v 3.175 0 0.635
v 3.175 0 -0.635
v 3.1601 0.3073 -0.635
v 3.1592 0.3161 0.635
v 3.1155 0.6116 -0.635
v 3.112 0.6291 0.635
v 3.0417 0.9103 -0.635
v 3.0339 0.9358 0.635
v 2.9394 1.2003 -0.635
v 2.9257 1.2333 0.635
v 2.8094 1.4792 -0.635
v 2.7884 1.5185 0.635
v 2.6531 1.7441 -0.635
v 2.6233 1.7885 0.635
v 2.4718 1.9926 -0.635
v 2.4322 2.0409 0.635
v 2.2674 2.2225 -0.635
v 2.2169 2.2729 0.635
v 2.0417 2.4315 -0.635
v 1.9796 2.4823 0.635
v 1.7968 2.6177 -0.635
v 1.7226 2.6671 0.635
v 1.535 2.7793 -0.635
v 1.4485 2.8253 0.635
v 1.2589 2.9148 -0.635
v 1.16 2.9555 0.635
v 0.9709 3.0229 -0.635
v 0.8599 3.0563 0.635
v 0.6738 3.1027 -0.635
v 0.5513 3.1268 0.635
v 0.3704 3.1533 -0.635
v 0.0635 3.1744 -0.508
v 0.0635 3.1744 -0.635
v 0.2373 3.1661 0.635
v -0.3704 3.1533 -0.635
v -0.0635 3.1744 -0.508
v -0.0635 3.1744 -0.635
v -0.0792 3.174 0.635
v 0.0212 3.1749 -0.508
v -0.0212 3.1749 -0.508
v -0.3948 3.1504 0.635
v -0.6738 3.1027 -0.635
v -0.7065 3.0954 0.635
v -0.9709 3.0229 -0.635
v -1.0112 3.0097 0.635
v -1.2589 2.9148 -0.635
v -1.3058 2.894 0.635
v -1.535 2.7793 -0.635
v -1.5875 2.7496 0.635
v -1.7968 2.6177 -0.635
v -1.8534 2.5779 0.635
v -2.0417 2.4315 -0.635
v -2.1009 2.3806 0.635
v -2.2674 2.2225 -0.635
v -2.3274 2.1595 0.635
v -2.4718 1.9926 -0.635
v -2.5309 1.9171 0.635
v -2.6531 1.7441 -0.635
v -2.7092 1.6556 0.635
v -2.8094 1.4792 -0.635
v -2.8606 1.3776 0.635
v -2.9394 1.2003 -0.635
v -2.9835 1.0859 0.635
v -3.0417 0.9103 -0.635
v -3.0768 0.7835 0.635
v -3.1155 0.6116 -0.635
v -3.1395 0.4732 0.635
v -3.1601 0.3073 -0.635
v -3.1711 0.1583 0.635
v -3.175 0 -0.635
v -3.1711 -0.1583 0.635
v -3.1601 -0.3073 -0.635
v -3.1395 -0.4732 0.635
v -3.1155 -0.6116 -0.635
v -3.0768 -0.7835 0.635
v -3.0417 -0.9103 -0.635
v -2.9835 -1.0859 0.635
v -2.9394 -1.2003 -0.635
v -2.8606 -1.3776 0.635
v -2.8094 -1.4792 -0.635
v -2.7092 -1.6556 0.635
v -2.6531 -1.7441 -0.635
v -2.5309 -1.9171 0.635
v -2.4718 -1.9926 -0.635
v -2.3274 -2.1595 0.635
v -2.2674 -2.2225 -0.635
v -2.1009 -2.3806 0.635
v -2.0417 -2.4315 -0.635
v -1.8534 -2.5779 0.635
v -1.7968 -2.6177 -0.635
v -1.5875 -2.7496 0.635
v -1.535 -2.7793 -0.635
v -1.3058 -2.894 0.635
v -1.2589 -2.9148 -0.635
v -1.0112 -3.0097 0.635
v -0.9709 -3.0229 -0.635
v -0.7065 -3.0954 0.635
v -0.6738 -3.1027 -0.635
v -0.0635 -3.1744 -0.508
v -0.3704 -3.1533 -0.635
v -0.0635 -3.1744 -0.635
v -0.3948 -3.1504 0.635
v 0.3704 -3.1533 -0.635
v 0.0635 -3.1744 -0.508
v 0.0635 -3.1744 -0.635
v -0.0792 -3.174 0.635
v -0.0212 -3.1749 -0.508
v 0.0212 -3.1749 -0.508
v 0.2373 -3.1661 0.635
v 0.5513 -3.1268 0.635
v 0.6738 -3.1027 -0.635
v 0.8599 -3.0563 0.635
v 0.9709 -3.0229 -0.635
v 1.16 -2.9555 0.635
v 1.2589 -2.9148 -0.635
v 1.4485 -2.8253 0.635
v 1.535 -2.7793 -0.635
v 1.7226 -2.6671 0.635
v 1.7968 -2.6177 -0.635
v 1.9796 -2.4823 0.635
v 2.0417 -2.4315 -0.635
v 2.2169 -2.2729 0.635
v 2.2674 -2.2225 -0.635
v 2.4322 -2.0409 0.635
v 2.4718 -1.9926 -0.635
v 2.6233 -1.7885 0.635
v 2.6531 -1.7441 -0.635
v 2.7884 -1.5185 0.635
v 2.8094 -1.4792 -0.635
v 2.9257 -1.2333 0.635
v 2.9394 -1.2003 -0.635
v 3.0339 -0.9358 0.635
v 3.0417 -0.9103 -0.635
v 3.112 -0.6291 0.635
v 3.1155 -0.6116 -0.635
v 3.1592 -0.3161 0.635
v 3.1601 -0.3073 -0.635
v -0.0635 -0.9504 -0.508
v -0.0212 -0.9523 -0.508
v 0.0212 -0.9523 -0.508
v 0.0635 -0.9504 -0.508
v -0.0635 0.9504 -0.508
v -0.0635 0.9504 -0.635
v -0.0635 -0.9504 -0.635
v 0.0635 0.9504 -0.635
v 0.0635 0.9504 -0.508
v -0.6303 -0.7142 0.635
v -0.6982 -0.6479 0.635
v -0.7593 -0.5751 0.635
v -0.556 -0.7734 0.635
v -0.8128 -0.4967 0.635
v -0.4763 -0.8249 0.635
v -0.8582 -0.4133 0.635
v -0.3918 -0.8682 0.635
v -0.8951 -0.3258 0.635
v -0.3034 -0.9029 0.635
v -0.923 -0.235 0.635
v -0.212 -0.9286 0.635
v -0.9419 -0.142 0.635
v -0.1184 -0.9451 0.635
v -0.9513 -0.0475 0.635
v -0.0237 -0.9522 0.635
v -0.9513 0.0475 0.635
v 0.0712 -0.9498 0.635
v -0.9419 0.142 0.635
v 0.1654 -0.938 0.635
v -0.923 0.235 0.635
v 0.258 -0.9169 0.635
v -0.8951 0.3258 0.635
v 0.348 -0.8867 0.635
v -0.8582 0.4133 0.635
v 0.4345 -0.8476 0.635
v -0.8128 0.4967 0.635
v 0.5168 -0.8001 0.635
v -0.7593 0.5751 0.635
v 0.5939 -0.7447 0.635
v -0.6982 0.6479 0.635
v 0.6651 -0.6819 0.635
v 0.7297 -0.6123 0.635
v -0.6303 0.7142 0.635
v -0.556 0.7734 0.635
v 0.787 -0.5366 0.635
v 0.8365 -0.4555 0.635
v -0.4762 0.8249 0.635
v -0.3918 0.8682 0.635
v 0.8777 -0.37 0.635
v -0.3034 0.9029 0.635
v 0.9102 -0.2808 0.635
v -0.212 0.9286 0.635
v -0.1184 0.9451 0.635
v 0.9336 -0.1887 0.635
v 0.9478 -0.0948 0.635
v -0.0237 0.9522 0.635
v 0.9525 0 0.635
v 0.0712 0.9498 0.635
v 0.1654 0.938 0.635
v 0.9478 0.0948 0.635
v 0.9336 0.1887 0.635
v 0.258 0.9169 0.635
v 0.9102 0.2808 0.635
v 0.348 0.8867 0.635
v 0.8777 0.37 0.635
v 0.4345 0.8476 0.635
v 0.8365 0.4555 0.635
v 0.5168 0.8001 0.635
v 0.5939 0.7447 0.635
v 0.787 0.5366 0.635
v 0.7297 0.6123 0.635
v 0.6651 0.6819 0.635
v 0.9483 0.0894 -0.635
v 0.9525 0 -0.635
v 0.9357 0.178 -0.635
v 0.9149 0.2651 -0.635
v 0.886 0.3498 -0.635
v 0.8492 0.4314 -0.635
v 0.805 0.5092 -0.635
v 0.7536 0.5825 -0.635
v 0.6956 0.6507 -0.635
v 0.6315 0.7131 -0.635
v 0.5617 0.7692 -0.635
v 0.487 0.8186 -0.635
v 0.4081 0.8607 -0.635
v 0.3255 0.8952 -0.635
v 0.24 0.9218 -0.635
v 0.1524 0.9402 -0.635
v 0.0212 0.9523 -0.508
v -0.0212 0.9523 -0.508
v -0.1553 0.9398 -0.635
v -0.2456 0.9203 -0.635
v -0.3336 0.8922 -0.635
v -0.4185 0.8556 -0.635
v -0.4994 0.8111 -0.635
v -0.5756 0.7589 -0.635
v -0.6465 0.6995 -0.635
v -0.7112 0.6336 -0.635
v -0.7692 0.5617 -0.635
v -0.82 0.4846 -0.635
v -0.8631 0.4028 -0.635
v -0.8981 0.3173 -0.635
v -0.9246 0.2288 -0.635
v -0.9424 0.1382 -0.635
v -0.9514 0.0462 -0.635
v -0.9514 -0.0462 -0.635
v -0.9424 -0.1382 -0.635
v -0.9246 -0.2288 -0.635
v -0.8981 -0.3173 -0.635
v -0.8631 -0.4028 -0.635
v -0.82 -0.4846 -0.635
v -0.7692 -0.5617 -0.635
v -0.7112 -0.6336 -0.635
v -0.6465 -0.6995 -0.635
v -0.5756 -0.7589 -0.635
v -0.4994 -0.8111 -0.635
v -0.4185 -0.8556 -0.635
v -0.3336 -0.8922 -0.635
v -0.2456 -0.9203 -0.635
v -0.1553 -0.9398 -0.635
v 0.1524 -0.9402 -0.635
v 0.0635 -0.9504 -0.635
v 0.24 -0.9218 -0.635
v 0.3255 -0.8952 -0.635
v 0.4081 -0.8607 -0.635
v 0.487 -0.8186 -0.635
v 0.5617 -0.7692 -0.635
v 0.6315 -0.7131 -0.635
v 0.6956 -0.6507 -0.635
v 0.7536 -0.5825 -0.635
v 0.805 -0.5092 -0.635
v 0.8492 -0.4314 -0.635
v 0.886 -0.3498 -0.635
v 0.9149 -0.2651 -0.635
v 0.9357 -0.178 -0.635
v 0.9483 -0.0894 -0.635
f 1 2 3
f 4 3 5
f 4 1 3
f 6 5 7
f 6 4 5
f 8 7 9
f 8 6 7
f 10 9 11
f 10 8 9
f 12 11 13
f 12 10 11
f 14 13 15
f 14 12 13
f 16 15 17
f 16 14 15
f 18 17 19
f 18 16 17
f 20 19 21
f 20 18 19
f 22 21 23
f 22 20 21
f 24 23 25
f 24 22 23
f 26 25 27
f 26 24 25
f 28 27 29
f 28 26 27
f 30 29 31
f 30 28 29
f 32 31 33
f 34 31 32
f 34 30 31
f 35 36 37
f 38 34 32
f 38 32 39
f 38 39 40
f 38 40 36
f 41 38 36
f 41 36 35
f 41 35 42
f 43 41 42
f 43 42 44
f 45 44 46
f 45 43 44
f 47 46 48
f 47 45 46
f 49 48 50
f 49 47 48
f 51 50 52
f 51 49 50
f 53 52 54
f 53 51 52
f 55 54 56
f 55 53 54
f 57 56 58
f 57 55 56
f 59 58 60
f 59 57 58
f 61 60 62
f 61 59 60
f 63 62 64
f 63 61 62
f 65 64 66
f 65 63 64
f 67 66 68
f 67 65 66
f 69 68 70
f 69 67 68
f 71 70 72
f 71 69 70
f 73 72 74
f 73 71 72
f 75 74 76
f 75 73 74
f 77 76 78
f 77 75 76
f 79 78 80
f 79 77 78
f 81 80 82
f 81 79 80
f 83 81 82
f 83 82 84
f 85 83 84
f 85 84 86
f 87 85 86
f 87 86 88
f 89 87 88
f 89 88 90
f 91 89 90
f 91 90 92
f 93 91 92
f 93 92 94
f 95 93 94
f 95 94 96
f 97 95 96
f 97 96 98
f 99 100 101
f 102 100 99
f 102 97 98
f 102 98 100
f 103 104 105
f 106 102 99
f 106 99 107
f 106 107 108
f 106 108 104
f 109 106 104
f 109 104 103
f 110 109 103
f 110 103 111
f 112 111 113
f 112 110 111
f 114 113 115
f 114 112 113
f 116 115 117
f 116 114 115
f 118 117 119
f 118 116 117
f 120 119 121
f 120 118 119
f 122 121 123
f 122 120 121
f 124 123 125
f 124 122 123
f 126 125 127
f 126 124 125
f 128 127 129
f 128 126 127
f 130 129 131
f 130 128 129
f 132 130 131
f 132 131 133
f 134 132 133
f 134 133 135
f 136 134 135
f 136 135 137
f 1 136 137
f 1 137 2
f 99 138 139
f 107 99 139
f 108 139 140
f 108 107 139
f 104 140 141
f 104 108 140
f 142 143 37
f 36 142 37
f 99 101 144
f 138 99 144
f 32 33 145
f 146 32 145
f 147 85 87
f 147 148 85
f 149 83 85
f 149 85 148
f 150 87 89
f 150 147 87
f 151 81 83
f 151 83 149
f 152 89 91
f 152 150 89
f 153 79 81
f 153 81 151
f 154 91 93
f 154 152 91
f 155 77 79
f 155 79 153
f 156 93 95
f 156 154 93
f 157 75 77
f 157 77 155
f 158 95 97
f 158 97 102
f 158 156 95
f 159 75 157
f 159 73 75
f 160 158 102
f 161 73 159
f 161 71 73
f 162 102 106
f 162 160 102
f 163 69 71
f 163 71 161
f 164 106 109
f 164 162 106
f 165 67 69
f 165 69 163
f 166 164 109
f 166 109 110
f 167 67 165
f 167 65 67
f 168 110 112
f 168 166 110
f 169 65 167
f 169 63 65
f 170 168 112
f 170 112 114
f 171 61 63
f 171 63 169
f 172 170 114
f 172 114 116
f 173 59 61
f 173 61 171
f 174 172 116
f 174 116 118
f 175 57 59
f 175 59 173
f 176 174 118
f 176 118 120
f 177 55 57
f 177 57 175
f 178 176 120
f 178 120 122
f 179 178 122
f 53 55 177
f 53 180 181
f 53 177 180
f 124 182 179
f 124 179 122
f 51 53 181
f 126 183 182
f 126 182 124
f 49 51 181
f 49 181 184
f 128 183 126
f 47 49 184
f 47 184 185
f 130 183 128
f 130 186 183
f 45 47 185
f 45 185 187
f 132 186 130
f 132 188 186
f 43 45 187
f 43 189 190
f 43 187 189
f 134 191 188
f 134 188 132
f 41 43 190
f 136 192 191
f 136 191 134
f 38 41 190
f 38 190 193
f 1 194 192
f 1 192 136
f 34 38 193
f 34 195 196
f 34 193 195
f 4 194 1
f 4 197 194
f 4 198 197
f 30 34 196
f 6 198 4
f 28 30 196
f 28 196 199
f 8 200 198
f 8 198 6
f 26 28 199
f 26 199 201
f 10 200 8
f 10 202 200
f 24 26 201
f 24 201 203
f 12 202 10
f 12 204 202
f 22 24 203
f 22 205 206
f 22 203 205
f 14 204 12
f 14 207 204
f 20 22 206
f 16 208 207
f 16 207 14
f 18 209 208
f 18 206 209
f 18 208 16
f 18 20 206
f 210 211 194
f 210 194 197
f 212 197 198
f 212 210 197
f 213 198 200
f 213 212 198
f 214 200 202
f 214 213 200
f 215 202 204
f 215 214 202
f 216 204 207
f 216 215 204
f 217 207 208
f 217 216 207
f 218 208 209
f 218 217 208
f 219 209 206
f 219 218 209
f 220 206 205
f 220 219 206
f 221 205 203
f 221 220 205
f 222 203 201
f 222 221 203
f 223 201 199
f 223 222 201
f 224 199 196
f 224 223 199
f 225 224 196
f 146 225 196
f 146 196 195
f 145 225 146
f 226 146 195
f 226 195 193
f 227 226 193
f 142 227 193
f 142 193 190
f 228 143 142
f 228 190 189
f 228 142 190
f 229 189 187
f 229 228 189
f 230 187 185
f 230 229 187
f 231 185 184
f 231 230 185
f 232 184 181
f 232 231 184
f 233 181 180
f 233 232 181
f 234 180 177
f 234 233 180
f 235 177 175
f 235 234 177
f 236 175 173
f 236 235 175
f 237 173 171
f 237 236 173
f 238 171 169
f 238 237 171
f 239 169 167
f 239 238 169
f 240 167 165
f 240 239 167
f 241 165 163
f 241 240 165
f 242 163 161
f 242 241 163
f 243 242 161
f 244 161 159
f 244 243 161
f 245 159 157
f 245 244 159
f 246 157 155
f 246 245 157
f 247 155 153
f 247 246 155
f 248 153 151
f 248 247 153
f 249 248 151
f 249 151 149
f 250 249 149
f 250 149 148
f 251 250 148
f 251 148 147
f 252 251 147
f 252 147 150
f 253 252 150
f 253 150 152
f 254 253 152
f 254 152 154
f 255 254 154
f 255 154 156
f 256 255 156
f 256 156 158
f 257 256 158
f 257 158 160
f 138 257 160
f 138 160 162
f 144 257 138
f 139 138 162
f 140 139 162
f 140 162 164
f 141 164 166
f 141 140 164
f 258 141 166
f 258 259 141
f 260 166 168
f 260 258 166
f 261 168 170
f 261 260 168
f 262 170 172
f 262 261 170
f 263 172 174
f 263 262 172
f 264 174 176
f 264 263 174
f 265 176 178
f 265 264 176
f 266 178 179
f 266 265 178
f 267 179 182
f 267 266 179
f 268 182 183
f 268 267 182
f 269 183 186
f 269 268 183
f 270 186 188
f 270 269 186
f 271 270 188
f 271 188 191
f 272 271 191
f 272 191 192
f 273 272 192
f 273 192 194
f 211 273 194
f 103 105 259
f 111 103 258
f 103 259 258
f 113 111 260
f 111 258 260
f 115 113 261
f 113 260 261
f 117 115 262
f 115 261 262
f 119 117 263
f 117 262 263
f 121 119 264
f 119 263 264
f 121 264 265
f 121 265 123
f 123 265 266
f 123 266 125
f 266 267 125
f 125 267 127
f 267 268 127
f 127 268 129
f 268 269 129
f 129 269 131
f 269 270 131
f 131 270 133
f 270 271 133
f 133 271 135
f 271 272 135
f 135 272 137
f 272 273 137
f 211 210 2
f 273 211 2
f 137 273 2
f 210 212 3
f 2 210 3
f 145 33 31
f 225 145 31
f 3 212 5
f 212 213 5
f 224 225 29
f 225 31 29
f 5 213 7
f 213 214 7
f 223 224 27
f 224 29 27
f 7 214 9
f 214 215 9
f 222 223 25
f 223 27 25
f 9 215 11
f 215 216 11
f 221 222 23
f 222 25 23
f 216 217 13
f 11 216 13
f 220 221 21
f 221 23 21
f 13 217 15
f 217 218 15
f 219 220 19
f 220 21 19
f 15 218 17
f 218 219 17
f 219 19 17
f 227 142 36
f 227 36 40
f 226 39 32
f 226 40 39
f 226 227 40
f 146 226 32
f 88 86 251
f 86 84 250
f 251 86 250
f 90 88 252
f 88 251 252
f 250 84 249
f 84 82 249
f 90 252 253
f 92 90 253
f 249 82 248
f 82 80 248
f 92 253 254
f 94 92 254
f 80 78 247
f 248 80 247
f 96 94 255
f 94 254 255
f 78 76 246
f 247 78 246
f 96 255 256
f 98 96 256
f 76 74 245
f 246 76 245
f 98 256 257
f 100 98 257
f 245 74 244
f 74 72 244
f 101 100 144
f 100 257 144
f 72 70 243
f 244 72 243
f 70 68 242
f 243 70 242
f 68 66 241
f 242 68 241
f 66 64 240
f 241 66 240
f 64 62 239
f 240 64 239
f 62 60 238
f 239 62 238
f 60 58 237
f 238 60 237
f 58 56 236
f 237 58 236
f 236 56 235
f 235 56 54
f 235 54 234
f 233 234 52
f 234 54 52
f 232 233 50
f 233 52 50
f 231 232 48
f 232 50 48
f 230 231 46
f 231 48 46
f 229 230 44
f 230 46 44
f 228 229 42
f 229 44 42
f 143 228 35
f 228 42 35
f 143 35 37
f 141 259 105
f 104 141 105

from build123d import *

# Parameters (mm, degrees)
F0_R     = 3.175
F0_R_2   = 0.9525
F1_DEPTH = 0.635
F3_DEPTH = 0.127


with BuildPart() as f1:
    # F0 (on Top) → F1 (new body, symmetric)
    with BuildSketch(Plane.XY):
        Circle(F0_R)
        Circle(F0_R_2, mode=Mode.SUBTRACT)
    extrude(amount=F1_DEPTH, both=True)

    # F2 (on face) → F3 (cut)
    with BuildSketch(Plane(origin=(0, 0, -0.635), x_dir=(1, 0, 0), z_dir=(0, 0, -1))):
        with BuildLine():
            Line((0.0635, 0.9503809762), (0.0635, 3.1743649365))
            ThreePointArc((0.0635, 3.1743649365), (0, 3.175), (-0.0635, 3.1743649365))
            Line((-0.0635, 3.1743649365), (-0.0635, 0.9503809762))
            ThreePointArc((-0.0635, 0.9503809762), (0, 0.9525), (0.0635, 0.9503809762))
        make_face()
        with BuildLine():
            Line((-0.0635, -0.9503809762), (-0.0635, -3.1743649365))
            ThreePointArc((-0.0635, -3.1743649365), (0, -3.175), (0.0635, -3.1743649365))
            Line((0.0635, -3.1743649365), (0.0635, -0.9503809762))
            ThreePointArc((0.0635, -0.9503809762), (0, -0.9525), (-0.0635, -0.9503809762))
        make_face()
        with BuildLine():
            ThreePointArc((0.0635, -3.1743649365), (0, -3.175), (-0.0635, -3.1743649365))
            Line((-0.0635, -3.1743649365), (-0.0635, -3.81))
            Line((-0.0635, -3.81), (0.0635, -3.81))
            Line((0.0635, -3.81), (0.0635, -3.1743649365))
        make_face()
        with BuildLine():
            Line((0.0635, -0.9503809762), (0.0635, 0.9503809762))
            ThreePointArc((0.0635, 0.9503809762), (0, 0.9525), (-0.0635, 0.9503809762))
            Line((-0.0635, 0.9503809762), (-0.0635, -0.9503809762))
            ThreePointArc((-0.0635, -0.9503809762), (0, -0.9525), (0.0635, -0.9503809762))
        make_face()
        with BuildLine():
            Line((0.0635, 3.1743649365), (0.0635, 3.81))
            Line((0.0635, 3.81), (-0.0635, 3.81))
            Line((-0.0635, 3.81), (-0.0635, 3.1743649365))
            ThreePointArc((-0.0635, 3.1743649365), (0, 3.175), (0.0635, 3.1743649365))
        make_face()
    extrude(amount=-F3_DEPTH, mode=Mode.SUBTRACT)


solid = f1.part
